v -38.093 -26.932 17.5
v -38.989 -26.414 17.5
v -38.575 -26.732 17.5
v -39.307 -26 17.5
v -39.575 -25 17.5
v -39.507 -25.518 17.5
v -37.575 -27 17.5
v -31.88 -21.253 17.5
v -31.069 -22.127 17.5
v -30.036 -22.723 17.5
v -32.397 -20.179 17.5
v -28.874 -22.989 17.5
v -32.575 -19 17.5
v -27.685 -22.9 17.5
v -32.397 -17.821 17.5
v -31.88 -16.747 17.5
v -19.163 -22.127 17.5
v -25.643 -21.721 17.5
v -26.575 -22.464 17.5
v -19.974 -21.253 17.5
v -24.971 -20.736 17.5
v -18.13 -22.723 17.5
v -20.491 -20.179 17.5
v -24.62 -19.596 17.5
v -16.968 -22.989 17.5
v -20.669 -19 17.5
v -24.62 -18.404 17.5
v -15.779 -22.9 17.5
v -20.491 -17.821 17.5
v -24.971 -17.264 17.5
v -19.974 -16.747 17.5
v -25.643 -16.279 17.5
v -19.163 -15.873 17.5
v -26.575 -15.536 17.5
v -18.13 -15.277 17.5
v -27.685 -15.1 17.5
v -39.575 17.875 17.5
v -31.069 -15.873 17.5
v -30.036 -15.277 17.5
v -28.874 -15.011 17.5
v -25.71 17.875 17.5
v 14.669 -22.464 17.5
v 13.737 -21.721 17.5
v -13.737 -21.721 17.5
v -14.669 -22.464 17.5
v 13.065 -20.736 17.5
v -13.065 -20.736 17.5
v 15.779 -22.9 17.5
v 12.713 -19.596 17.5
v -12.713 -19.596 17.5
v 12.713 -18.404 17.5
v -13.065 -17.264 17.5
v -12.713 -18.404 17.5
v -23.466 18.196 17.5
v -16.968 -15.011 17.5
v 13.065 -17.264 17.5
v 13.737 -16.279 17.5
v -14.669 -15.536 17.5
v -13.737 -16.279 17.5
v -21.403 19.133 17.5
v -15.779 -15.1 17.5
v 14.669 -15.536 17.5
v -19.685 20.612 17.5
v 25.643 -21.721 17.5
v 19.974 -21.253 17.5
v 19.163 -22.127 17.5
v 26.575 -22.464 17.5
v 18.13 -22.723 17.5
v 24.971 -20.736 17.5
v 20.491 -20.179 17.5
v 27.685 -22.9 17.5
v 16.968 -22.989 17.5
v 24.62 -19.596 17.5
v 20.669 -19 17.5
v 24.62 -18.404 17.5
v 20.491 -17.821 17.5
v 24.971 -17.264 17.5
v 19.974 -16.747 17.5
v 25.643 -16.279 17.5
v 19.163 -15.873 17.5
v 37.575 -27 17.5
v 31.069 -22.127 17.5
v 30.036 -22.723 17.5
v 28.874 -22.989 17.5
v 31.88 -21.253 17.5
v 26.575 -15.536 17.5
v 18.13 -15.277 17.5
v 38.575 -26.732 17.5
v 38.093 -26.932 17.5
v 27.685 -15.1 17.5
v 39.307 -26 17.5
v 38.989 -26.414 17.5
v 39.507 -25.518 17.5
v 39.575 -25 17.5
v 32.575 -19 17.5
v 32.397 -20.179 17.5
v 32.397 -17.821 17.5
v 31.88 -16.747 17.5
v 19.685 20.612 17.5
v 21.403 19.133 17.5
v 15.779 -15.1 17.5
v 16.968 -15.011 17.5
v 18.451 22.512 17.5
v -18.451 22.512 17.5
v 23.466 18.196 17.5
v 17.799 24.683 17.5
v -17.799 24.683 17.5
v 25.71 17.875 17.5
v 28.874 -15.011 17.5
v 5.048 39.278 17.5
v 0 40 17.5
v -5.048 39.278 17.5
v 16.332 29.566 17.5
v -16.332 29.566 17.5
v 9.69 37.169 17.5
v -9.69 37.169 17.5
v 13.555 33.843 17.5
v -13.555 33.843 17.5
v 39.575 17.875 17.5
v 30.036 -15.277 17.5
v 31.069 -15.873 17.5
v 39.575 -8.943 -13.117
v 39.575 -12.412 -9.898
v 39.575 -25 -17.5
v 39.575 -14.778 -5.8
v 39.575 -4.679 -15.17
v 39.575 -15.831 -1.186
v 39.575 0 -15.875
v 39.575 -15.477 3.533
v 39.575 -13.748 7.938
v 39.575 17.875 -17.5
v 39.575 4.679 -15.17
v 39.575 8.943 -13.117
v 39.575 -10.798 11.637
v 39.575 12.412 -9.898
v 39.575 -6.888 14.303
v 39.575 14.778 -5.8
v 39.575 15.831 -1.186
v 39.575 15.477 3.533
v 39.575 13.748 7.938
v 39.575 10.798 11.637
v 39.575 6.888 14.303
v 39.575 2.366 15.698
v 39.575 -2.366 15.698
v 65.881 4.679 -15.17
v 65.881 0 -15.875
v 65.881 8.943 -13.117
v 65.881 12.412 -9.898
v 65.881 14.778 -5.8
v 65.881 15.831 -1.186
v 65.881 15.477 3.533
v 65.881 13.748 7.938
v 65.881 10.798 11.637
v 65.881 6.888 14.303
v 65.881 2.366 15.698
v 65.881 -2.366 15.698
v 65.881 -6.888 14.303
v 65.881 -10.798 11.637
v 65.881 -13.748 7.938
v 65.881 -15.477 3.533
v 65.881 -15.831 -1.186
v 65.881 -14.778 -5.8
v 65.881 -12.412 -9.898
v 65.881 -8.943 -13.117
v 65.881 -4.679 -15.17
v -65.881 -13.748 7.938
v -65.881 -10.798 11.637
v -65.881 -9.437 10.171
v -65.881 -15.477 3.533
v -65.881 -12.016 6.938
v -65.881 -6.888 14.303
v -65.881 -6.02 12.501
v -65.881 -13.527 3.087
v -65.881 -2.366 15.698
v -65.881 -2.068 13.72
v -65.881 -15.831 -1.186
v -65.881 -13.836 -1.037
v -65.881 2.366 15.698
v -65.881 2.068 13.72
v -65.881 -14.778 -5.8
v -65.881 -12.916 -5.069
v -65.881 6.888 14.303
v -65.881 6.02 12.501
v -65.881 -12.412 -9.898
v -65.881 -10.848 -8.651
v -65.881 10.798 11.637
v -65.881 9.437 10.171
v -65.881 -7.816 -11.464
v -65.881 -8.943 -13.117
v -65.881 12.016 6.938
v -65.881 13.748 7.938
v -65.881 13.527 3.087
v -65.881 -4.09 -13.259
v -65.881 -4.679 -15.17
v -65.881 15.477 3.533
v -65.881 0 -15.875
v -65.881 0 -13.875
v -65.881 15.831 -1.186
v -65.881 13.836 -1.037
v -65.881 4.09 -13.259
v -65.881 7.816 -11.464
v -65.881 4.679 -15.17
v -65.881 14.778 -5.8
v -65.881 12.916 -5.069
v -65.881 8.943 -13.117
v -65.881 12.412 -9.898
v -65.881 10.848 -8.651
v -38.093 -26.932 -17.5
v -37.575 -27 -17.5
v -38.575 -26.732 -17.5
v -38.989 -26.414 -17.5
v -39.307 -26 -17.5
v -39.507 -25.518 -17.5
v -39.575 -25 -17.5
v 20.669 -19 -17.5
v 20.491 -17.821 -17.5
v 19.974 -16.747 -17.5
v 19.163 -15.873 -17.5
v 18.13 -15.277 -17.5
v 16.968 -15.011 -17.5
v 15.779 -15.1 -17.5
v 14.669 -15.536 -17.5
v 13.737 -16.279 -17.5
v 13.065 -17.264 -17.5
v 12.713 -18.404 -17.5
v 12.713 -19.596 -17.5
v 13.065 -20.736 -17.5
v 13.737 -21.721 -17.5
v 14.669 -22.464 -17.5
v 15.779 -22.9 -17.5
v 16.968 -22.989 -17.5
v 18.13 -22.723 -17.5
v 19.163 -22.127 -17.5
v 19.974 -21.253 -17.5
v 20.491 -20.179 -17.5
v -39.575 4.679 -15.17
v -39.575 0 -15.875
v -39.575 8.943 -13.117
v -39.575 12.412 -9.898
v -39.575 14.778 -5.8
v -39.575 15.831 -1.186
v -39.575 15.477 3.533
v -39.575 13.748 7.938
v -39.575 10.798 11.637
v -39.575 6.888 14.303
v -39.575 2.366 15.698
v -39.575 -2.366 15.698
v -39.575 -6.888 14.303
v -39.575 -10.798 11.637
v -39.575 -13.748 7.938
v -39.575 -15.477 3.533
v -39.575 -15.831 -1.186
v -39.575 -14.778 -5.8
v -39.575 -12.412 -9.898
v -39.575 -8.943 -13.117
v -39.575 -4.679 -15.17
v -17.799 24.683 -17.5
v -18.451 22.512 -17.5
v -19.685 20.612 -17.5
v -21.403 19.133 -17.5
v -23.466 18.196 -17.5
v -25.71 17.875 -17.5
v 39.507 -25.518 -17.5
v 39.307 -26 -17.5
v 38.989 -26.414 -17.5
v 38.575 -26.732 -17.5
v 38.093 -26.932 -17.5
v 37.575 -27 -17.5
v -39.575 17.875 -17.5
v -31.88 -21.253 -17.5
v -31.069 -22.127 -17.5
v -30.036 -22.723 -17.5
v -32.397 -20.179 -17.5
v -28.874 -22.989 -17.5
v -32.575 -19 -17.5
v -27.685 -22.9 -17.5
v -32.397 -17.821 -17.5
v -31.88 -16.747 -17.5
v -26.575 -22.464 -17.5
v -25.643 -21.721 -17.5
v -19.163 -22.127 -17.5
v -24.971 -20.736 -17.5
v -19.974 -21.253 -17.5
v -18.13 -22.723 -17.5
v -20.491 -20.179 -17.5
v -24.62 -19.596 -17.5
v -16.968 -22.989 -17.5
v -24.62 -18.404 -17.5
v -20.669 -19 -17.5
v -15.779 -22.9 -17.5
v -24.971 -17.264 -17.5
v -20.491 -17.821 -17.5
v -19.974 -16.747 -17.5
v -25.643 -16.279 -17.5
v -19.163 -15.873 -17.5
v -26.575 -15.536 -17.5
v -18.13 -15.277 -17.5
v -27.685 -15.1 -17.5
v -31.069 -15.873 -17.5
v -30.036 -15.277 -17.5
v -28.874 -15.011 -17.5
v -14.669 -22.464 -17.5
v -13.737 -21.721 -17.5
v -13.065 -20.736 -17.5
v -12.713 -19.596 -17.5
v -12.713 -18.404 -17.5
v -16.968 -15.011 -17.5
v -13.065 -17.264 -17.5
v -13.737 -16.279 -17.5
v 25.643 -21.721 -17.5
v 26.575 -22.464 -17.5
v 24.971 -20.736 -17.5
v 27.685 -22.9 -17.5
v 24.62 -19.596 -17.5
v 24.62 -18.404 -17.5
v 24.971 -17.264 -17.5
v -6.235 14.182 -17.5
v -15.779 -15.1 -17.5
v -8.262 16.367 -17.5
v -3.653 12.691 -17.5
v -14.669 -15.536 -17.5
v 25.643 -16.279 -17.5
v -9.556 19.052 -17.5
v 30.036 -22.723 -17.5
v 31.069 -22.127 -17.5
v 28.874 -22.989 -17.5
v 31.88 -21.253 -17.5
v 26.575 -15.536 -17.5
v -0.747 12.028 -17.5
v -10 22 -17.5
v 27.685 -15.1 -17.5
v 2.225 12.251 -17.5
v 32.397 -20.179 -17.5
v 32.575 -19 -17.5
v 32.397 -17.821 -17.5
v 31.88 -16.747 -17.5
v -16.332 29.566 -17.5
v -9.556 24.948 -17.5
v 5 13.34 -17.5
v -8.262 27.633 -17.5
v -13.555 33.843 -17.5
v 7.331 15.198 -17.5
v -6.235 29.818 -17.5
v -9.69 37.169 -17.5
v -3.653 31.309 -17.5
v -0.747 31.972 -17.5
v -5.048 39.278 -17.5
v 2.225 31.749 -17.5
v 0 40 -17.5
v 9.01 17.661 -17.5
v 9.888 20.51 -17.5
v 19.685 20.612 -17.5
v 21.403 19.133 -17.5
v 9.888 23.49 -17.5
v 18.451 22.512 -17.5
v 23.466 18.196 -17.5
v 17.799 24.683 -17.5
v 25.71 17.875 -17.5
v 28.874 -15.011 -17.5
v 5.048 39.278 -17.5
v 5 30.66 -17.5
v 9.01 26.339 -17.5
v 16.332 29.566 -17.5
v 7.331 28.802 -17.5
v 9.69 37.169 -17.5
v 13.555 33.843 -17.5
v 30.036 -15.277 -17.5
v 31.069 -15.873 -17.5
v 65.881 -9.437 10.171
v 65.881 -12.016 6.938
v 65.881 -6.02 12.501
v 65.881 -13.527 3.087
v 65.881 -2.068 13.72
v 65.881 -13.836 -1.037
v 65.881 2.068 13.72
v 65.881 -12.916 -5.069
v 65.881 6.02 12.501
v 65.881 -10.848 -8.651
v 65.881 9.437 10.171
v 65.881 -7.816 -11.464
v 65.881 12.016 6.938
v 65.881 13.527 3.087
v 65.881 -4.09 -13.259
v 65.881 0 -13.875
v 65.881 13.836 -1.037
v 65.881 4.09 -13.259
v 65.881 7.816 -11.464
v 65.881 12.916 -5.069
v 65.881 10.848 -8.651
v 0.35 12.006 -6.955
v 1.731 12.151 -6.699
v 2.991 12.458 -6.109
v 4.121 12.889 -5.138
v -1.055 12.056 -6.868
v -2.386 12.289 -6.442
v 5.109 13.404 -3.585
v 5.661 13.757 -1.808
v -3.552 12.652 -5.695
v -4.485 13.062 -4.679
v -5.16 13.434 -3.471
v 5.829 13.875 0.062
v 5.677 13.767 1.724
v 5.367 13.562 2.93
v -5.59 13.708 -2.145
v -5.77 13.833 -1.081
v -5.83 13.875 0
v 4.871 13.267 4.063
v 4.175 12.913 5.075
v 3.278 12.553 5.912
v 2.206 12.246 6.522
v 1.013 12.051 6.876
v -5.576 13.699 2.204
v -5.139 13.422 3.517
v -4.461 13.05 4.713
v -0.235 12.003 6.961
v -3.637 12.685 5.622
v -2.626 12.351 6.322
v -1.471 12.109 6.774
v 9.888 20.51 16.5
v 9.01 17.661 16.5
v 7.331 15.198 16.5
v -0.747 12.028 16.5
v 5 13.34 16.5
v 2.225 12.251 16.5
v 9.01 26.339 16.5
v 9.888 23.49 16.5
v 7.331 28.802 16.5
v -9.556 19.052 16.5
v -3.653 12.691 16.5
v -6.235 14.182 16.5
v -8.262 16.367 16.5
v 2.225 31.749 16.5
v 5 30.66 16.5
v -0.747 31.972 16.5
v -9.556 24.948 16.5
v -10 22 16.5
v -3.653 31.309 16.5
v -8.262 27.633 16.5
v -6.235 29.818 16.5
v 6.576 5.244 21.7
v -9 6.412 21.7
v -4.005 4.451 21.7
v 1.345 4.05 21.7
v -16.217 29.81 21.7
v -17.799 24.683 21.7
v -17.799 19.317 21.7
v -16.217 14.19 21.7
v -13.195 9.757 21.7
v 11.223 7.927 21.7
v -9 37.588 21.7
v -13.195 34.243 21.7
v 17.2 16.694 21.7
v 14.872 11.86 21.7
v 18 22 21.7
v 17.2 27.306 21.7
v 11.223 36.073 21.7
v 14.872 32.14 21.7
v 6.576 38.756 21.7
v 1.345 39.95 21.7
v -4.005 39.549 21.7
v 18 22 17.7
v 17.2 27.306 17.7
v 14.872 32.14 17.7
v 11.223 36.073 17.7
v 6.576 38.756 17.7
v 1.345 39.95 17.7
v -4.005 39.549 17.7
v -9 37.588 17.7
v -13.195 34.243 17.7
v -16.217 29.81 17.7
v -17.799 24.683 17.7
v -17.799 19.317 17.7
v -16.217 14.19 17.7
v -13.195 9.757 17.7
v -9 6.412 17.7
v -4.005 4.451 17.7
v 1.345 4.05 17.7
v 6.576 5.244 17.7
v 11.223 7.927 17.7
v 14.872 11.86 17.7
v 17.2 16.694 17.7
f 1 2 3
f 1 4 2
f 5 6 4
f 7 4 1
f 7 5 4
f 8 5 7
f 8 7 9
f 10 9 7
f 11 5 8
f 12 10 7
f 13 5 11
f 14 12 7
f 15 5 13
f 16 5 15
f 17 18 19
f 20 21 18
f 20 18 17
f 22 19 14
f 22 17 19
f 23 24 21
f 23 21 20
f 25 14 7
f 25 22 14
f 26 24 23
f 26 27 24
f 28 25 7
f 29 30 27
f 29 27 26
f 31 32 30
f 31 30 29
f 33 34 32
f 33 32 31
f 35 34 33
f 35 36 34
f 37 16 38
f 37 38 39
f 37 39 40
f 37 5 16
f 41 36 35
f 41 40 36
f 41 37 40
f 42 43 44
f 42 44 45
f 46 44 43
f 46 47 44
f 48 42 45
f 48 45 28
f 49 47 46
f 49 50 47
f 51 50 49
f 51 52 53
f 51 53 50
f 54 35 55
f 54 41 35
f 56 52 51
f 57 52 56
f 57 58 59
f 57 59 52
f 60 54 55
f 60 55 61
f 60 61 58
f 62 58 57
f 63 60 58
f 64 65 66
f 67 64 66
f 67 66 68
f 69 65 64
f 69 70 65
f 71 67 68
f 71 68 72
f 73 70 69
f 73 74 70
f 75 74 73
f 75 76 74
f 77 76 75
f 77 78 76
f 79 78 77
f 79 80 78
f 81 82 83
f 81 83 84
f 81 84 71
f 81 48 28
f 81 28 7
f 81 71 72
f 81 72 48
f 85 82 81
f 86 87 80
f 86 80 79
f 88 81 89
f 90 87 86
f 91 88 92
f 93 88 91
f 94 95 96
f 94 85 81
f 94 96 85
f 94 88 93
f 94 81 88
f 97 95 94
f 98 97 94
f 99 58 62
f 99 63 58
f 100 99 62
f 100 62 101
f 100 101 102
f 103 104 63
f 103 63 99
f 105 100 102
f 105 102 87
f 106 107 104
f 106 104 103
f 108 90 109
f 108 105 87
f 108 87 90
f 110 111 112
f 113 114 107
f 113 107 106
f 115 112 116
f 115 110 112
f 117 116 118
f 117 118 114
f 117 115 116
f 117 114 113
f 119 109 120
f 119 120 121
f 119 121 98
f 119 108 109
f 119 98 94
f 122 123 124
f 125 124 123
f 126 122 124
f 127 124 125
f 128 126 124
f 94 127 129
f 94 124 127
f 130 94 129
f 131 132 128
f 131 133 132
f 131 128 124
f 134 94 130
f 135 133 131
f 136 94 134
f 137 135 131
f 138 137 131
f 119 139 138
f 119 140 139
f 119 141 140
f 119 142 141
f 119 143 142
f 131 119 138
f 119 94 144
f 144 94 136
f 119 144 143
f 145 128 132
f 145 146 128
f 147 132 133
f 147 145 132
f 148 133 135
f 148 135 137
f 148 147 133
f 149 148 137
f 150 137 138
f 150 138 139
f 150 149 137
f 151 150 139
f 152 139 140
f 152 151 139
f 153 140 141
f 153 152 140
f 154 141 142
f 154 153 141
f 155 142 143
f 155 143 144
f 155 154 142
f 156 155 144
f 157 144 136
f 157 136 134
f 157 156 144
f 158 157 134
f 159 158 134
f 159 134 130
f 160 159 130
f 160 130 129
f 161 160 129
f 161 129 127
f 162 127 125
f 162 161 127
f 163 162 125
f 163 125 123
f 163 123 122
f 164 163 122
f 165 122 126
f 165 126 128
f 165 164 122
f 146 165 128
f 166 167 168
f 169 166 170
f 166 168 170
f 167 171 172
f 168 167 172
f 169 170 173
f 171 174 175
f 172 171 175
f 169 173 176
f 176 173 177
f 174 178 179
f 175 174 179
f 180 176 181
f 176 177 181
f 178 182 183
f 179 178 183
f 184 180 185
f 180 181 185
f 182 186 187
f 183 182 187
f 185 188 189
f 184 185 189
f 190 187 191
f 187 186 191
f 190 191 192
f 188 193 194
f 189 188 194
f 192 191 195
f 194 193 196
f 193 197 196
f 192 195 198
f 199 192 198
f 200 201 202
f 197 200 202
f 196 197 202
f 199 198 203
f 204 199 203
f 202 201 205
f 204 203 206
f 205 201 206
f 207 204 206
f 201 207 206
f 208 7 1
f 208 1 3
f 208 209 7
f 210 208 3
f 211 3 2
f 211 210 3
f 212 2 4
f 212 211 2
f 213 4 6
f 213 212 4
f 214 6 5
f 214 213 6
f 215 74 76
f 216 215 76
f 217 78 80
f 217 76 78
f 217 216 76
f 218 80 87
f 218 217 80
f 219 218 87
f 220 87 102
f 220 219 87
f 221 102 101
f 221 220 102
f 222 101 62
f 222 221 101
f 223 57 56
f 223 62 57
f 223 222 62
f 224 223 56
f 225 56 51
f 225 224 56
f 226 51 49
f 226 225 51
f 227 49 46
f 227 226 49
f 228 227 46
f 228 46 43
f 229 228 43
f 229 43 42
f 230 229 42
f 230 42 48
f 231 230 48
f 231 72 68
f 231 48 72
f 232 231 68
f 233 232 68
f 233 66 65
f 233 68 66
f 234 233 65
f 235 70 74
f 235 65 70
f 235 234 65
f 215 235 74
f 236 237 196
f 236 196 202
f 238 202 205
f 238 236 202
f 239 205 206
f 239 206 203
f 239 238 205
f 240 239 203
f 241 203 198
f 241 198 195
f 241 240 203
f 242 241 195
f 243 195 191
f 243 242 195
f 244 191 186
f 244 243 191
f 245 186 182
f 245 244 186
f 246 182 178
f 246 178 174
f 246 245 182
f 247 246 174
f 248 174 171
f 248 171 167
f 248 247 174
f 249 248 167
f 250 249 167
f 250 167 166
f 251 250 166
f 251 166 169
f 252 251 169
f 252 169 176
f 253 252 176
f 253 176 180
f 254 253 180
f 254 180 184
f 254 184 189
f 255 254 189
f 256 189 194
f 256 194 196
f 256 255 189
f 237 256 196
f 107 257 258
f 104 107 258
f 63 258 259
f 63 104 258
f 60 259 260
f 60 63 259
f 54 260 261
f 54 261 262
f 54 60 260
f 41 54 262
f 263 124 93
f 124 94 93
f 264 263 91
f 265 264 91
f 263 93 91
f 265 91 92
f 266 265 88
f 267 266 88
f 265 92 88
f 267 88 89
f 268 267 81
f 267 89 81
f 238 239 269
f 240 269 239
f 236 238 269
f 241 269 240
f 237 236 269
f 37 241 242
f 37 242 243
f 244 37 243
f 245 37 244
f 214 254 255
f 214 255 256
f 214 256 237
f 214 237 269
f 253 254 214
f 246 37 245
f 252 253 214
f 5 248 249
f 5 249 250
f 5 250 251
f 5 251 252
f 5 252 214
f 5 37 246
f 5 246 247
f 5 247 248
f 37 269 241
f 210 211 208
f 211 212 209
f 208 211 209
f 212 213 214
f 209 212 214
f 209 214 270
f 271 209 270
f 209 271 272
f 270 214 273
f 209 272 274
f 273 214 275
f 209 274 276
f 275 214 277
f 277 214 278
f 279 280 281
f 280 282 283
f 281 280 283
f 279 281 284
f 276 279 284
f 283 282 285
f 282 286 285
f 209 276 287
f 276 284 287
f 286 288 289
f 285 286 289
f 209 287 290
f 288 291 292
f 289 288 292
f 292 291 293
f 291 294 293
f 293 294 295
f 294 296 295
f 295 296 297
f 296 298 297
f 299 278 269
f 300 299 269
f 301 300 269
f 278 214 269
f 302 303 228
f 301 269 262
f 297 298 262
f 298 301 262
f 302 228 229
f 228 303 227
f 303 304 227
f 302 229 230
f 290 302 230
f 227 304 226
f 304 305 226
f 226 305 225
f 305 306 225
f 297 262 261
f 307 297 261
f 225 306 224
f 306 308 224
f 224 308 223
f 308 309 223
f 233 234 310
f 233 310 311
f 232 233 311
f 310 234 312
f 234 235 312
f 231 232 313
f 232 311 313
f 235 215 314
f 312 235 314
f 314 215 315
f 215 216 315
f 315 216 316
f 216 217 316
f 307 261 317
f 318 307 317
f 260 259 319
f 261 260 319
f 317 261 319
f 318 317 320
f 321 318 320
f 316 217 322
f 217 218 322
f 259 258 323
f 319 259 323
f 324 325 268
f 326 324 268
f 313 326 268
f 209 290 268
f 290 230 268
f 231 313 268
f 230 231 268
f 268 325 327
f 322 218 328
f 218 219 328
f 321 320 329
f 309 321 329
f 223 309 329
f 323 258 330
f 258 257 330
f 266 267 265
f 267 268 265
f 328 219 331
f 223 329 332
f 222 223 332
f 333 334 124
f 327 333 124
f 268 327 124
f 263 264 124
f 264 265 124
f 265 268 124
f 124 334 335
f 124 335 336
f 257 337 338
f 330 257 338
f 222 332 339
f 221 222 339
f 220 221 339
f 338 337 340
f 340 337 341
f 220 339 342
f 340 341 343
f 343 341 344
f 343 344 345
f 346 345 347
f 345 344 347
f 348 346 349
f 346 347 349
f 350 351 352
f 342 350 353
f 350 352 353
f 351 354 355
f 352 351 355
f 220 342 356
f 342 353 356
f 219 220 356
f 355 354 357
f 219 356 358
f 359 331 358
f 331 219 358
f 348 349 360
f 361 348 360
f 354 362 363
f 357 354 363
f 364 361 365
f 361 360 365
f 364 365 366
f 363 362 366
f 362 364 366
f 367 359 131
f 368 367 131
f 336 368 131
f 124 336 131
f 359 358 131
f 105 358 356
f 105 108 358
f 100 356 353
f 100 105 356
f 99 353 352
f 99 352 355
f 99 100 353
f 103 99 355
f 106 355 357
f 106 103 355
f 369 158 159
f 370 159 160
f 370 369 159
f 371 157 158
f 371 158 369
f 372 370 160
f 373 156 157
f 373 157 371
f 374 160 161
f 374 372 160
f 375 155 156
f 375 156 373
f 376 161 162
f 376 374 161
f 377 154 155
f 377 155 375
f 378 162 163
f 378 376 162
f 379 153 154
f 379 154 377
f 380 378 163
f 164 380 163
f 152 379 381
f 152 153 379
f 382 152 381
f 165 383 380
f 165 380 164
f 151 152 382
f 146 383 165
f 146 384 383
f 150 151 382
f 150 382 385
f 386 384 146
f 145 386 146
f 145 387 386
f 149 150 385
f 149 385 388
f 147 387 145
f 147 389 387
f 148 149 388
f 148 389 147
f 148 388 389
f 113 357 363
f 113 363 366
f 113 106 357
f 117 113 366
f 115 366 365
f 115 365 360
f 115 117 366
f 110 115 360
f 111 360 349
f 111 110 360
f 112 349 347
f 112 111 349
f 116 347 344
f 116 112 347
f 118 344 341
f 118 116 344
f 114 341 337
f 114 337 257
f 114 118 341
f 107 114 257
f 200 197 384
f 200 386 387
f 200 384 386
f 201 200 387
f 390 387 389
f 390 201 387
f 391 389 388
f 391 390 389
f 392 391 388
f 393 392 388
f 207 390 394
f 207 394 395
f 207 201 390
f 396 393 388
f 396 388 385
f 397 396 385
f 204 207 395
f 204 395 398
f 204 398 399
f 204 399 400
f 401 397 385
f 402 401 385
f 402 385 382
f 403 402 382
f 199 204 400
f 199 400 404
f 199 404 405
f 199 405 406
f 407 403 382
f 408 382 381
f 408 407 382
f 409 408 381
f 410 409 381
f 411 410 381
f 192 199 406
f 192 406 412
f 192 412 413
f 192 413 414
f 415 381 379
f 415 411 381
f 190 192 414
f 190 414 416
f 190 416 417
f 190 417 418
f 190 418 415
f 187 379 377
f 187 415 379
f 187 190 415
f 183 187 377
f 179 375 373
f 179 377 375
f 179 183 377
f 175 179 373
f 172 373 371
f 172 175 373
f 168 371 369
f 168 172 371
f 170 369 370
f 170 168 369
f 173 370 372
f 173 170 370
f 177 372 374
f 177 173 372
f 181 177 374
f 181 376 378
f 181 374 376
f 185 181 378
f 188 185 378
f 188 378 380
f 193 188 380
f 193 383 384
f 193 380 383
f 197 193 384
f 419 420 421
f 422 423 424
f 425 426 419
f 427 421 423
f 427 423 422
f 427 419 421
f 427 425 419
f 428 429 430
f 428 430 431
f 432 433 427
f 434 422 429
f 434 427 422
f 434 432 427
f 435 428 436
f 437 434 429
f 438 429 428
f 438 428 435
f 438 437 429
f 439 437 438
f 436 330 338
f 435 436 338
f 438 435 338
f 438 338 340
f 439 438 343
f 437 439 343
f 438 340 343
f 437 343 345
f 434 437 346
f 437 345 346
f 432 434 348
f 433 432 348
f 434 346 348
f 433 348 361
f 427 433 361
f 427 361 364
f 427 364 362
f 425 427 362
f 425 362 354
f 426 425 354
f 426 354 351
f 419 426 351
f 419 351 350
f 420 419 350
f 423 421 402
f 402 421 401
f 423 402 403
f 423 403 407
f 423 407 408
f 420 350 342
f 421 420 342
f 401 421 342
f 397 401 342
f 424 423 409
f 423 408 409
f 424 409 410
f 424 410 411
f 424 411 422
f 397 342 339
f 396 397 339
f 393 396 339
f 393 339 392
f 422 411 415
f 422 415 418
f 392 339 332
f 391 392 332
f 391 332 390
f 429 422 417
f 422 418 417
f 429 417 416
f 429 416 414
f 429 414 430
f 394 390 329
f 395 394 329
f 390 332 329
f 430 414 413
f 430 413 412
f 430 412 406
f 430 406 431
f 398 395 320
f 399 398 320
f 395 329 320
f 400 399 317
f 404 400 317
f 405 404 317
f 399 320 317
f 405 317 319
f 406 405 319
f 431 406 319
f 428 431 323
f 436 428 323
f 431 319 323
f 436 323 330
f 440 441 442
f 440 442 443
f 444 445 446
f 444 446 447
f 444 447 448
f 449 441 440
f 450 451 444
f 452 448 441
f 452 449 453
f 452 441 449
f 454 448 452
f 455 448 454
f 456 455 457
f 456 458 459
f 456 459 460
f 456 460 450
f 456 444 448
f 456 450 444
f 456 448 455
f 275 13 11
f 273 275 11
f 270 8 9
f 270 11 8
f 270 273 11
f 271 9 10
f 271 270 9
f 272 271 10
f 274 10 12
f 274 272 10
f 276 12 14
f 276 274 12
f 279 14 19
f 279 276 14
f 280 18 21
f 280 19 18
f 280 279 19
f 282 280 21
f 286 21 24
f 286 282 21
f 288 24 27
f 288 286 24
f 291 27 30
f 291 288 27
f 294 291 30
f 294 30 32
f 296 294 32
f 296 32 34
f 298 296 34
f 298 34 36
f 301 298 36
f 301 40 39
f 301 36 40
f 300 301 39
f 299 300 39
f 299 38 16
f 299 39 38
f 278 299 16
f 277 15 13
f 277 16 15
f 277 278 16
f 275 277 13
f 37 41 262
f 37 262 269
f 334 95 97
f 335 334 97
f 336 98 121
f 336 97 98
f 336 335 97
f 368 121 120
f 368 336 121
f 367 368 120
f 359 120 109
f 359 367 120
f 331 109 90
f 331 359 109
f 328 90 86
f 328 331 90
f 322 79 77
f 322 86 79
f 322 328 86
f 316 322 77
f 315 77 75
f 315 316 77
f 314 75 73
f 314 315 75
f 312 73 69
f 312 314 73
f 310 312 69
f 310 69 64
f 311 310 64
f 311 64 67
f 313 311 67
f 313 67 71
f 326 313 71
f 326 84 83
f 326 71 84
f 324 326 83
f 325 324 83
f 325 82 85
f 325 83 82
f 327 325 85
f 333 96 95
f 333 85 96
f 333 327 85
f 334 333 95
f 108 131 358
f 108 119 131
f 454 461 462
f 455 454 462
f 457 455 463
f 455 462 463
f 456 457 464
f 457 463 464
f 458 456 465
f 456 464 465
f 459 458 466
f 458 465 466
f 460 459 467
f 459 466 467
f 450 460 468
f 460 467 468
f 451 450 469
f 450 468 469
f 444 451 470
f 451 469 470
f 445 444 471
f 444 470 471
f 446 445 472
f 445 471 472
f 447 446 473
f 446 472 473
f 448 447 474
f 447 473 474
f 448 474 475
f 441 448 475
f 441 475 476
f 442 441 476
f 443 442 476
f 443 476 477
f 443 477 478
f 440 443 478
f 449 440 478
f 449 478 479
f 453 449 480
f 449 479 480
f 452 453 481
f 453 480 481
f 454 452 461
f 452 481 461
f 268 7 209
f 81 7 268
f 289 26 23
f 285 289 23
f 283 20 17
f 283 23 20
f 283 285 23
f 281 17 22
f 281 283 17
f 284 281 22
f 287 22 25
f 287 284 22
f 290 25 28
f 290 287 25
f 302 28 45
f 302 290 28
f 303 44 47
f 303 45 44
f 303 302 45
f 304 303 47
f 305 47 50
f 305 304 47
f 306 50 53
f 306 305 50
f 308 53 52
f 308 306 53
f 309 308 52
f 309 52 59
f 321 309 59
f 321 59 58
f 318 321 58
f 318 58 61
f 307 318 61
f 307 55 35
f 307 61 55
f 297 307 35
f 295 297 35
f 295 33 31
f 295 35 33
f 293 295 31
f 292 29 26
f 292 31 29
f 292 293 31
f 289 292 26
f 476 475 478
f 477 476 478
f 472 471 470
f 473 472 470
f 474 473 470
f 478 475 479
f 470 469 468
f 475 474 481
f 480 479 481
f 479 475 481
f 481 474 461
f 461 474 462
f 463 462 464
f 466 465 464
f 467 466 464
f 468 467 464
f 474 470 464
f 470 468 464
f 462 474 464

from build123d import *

# Parameters (mm, degrees)
SKETCH2_R               = 15.875
SKETCH2_R_2             = 13.875
BOSS_EXTRUDE1_DEPTH     = 65.88125
SKETCH3_R               = 4
BOSS_EXTRUDE2_DEPTH     = 17.5
CUT_EXTRUDE1_DEPTH      = 80.035366144
CUT_EXTRUDE1_DEPTH_BACK = 80.035366144
SKETCH2_3_R             = 13.875
CUT_EXTRUDE2_DEPTH      = 80.035366144
CUT_EXTRUDE2_DEPTH_BACK = 80.035366144
SKETCH3_3_R             = 4
FILLET1_R               = 2
BOSS_EXTRUDE3_START     = 0.2
SKETCH4_R               = 18
BOSS_EXTRUDE3_DEPTH     = 4
SKETCH5_R               = 7.9375
BOSS_EXTRUDE4_DEPTH     = 40
CHAMFER1_SIZE           = 1
CUT_EXTRUDE3_START      = -25
CUT_EXTRUDE3_DEPTH      = 25
SKETCH8_R               = 10
CUT_EXTRUDE4_DEPTH      = 34


# Read off the part's stored shape, not the designer's step: Split1
with BuildPart() as part:
    # Sketch2 → Boss-Extrude1 (new, symmetric)
    # profile 1 of 2: a face of its own
    with BuildSketch(Plane(origin=(0, 0, 0), x_dir=(0, 0, -1), z_dir=(1, 0, 0))):
        Circle(SKETCH2_R)
        Circle(SKETCH2_R_2, mode=Mode.SUBTRACT)
    # profile 2 of 2: a face of its own
    with BuildSketch(Plane(origin=(0, 0, 0), x_dir=(0, 0, -1), z_dir=(1, 0, 0))):
        Circle(SKETCH2_R_2)
    extrude(amount=BOSS_EXTRUDE1_DEPTH, both=True)

    # Sketch3 → Boss-Extrude2 (add, symmetric)
    # profile 1 of 6: a face of its own
    with BuildSketch(Plane.XY):
        with BuildLine():
            Line((0, -27), (0, 40))
            ThreePointArc((0, 40), (-11.74119965, 35.643468429), (-17.798965194, 24.682692308))
            ThreePointArc((-17.798965194, 24.682692308), (-20.491305436, 19.811236254), (-25.709616392, 17.875))
            Line((-25.709616392, 17.875), (-39.575, 17.875))
            Line((-39.575, 17.875), (-39.575, -27))
            Line((-39.575, -27), (0, -27))
        make_face()
        with Locations((-28.575, -19)):
            Circle(SKETCH3_R, mode=Mode.SUBTRACT)
        with Locations((-16.66875, -19)):
            Circle(SKETCH3_R, mode=Mode.SUBTRACT)
    # profile 2 of 6: a face of its own
    with BuildSketch(Plane.XY):
        with Locations((-28.575, -19)):
            Circle(SKETCH3_R)
    # profile 3 of 6: a face of its own
    with BuildSketch(Plane.XY):
        with Locations((-16.66875, -19)):
            Circle(SKETCH3_R)
    # profile 4 of 6: a face of its own
    with BuildSketch(Plane.XY):
        with BuildLine():
            ThreePointArc((17.798965194, 24.682692308), (11.74119965, 35.643468429), (0, 40))
            Line((0, 40), (0, -27))
            Line((0, -27), (39.575, -27))
            Line((39.575, -27), (39.575, 17.875))
            Line((39.575, 17.875), (25.709616392, 17.875))
            ThreePointArc((25.709616392, 17.875), (20.491305436, 19.811236254), (17.798965194, 24.682692308))
        make_face()
        with Locations((16.66875, -19)):
            Circle(SKETCH3_R, mode=Mode.SUBTRACT)
        with Locations((28.575, -19)):
            Circle(SKETCH3_R, mode=Mode.SUBTRACT)
    # profile 5 of 6: a face of its own
    with BuildSketch(Plane.XY):
        with Locations((28.575, -19)):
            Circle(SKETCH3_R)
    # profile 6 of 6: a face of its own
    with BuildSketch(Plane.XY):
        with Locations((16.66875, -19)):
            Circle(SKETCH3_R)
    extrude(amount=BOSS_EXTRUDE2_DEPTH, both=True)

    # Sketch2<3> → Cut-Extrude1 (cut, two sides: drawn at the far end of the back side and taken through both)
    with BuildSketch(Plane(origin=(0, 0, 0), x_dir=(0, 0, -1), z_dir=(1, 0, 0)).offset(-CUT_EXTRUDE1_DEPTH_BACK)):
        Circle(SKETCH2_3_R)
    extrude(amount=CUT_EXTRUDE1_DEPTH + CUT_EXTRUDE1_DEPTH_BACK, mode=Mode.SUBTRACT)

    # Sketch3<3> → Cut-Extrude2 (cut, two sides: drawn at the far end of the back side and taken through both)
    with BuildSketch(Plane.XY.offset(-CUT_EXTRUDE2_DEPTH_BACK)):
        with Locations((16.66875, -19)):
            Circle(SKETCH3_3_R)
        with Locations((28.575, -19)):
            Circle(SKETCH3_3_R)
        with Locations(Location((-28.575, -19, 0), (0, 0, 180))):
            Circle(SKETCH3_3_R)
        with Locations(Location((-16.66875, -19, 0), (0, 0, 180))):
            Circle(SKETCH3_3_R)
    extrude(amount=CUT_EXTRUDE2_DEPTH + CUT_EXTRUDE2_DEPTH_BACK, mode=Mode.SUBTRACT)

    # Fillet1
    fillet1_edges = [part.edges().sort_by_distance(p)[0] for p in [
        (39.575, -27, 0),
        (-39.575, -27, 0),
    ]]
    fillet(fillet1_edges, radius=FILLET1_R)

    # Sketch5 → Boss-Extrude4 (add)
    with BuildSketch(Plane(origin=(0, 0, -17.5), x_dir=(-1, 0, 0), z_dir=(0, 0, -1))):
        with Locations(Location((0, 22, 0), (0, 0, 180))):
            Circle(SKETCH5_R)
    extrude(amount=BOSS_EXTRUDE4_DEPTH)

    # Chamfer1
    chamfer1_edges = [part.edges().sort_by_distance(p)[0] for p in [
        (-7.9375, 22, -57.5),
    ]]
    chamfer(chamfer1_edges, length=CHAMFER1_SIZE)

    # Sketch6 → Cut-Revolve1 (revolve, cut)
    with BuildSketch(Plane(origin=(0, 0, 0), x_dir=(0, 0, -1), z_dir=(1, 0, 0)), mode=Mode.PRIVATE) as cut_revolve1_sk:
        with BuildLine():
            Line((49.5, 29.9375), (45.027864045, 29.9375))
            ThreePointArc((45.027864045, 29.9375), (47.263932023, 28.9375), (49.5, 29.9375))
        make_face()
    revolve(cut_revolve1_sk.sketch.rotate(Axis((0, 22, -57.5), (0, 0, 1)), 90), axis=Axis((0, 22, -57.5), (0, 0, 1)), mode=Mode.SUBTRACT)

    # Sketch7 → Cut-Extrude3 (cut)
    with BuildSketch(Plane(origin=(0, 0, -57.5), x_dir=(-1, 0, 0), z_dir=(0, 0, -1)).offset(CUT_EXTRUDE3_START)):
        with BuildLine():
            Line((0, 29.4375), (0.4, 29.927414853))
            ThreePointArc((0.4, 29.927414853), (0, 29.9375), (-0.4, 29.927414853))
            Line((-0.4, 29.927414853), (0, 29.4375))
        make_face()
        with BuildLine():
            Line((1.291508321, 29.324507663), (1.770504244, 29.737520337))
            ThreePointArc((1.770504244, 29.737520337), (1.37833241, 29.81691154), (0.982658042, 29.87643888))
            Line((0.982658042, 29.87643888), (1.291508321, 29.324507663))
        make_face()
        with BuildLine():
            Line((2.543774816, 28.988963867), (3.087212613, 29.312525182))
            ThreePointArc((3.087212613, 29.312525182), (2.714784888, 29.458810177), (2.335458516, 29.586141297))
            Line((2.335458516, 29.586141297), (2.543774816, 28.988963867))
        make_face()
        with BuildLine():
            Line((3.71875, 28.441063941), (4.310117588, 28.665342649))
            ThreePointArc((4.310117588, 28.665342649), (3.96875, 28.874076643), (3.617297265, 29.065342649))
            Line((3.617297265, 29.065342649), (3.71875, 28.441063941))
        make_face()
        with BuildLine():
            Line((4.780732847, 27.697455546), (5.402061822, 27.815637052))
            ThreePointArc((5.402061822, 27.815637052), (5.102126652, 28.080477767), (4.789226267, 28.32986714))
            Line((4.789226267, 28.32986714), (4.780732847, 27.697455546))
        make_face()
        with BuildLine():
            Line((5.697455546, 26.780732847), (6.32986714, 26.789226267))
            ThreePointArc((6.32986714, 26.789226267), (6.080477767, 27.102126652), (5.815637052, 27.402061822))
            Line((5.815637052, 27.402061822), (5.697455546, 26.780732847))
        make_face()
        with BuildLine():
            Line((6.441063941, 25.71875), (7.065342649, 25.617297265))
            ThreePointArc((7.065342649, 25.617297265), (6.874076643, 25.96875), (6.665342649, 26.310117588))
            Line((6.665342649, 26.310117588), (6.441063941, 25.71875))
        make_face()
        with BuildLine():
            Line((6.988963867, 24.543774816), (7.586141297, 24.335458516))
            ThreePointArc((7.586141297, 24.335458516), (7.458810177, 24.714784888), (7.312525182, 25.087212613))
            Line((7.312525182, 25.087212613), (6.988963867, 24.543774816))
        make_face()
        with BuildLine():
            Line((7.324507663, 23.291508321), (7.87643888, 22.982658042))
            ThreePointArc((7.87643888, 22.982658042), (7.81691154, 23.37833241), (7.737520337, 23.770504244))
            Line((7.737520337, 23.770504244), (7.324507663, 23.291508321))
        make_face()
        with BuildLine():
            Line((7.4375, 22), (7.927414853, 21.6))
            ThreePointArc((7.927414853, 21.6), (7.9375, 22), (7.927414853, 22.4))
            Line((7.927414853, 22.4), (7.4375, 22))
        make_face()
        with BuildLine():
            Line((7.324507663, 20.708491679), (7.737520337, 20.229495756))
            ThreePointArc((7.737520337, 20.229495756), (7.81691154, 20.62166759), (7.87643888, 21.017341958))
            Line((7.87643888, 21.017341958), (7.324507663, 20.708491679))
        make_face()
        with BuildLine():
            Line((6.988963867, 19.456225184), (7.312525182, 18.912787387))
            ThreePointArc((7.312525182, 18.912787387), (7.458810177, 19.285215112), (7.586141297, 19.664541484))
            Line((7.586141297, 19.664541484), (6.988963867, 19.456225184))
        make_face()
        with BuildLine():
            Line((6.441063941, 18.28125), (6.665342649, 17.689882412))
            ThreePointArc((6.665342649, 17.689882412), (6.874076643, 18.03125), (7.065342649, 18.382702735))
            Line((7.065342649, 18.382702735), (6.441063941, 18.28125))
        make_face()
        with BuildLine():
            Line((5.697455546, 17.219267153), (5.815637052, 16.597938178))
            ThreePointArc((5.815637052, 16.597938178), (6.080477767, 16.897873348), (6.32986714, 17.210773733))
            Line((6.32986714, 17.210773733), (5.697455546, 17.219267153))
        make_face()
        with BuildLine():
            Line((4.780732847, 16.302544454), (4.789226267, 15.67013286))
            ThreePointArc((4.789226267, 15.67013286), (5.102126652, 15.919522233), (5.402061822, 16.184362948))
            Line((5.402061822, 16.184362948), (4.780732847, 16.302544454))
        make_face()
        with BuildLine():
            Line((3.71875, 15.558936059), (3.617297265, 14.934657351))
            ThreePointArc((3.617297265, 14.934657351), (3.96875, 15.125923357), (4.310117588, 15.334657351))
            Line((4.310117588, 15.334657351), (3.71875, 15.558936059))
        make_face()
        with BuildLine():
            Line((2.543774816, 15.011036133), (2.335458516, 14.413858703))
            ThreePointArc((2.335458516, 14.413858703), (2.714784888, 14.541189823), (3.087212613, 14.687474818))
            Line((3.087212613, 14.687474818), (2.543774816, 15.011036133))
        make_face()
        with BuildLine():
            Line((1.291508321, 14.675492337), (0.982658042, 14.12356112))
            ThreePointArc((0.982658042, 14.12356112), (1.37833241, 14.18308846), (1.770504244, 14.262479663))
            Line((1.770504244, 14.262479663), (1.291508321, 14.675492337))
        make_face()
        with BuildLine():
            Line((0, 14.5625), (-0.4, 14.072585147))
            ThreePointArc((-0.4, 14.072585147), (0, 14.0625), (0.4, 14.072585147))
            Line((0.4, 14.072585147), (0, 14.5625))
        make_face()
        with BuildLine():
            Line((-1.291508321, 14.675492337), (-1.770504244, 14.262479663))
            ThreePointArc((-1.770504244, 14.262479663), (-1.37833241, 14.18308846), (-0.982658042, 14.12356112))
            Line((-0.982658042, 14.12356112), (-1.291508321, 14.675492337))
        make_face()
        with BuildLine():
            Line((-2.543774816, 15.011036133), (-3.087212613, 14.687474818))
            ThreePointArc((-3.087212613, 14.687474818), (-2.714784888, 14.541189823), (-2.335458516, 14.413858703))
            Line((-2.335458516, 14.413858703), (-2.543774816, 15.011036133))
        make_face()
        with BuildLine():
            Line((-3.71875, 15.558936059), (-4.310117588, 15.334657351))
            ThreePointArc((-4.310117588, 15.334657351), (-3.96875, 15.125923357), (-3.617297265, 14.934657351))
            Line((-3.617297265, 14.934657351), (-3.71875, 15.558936059))
        make_face()
        with BuildLine():
            Line((-4.780732847, 16.302544454), (-5.402061822, 16.184362948))
            ThreePointArc((-5.402061822, 16.184362948), (-5.102126652, 15.919522233), (-4.789226267, 15.67013286))
            Line((-4.789226267, 15.67013286), (-4.780732847, 16.302544454))
        make_face()
        with BuildLine():
            Line((-5.697455546, 17.219267153), (-6.32986714, 17.210773733))
            ThreePointArc((-6.32986714, 17.210773733), (-6.080477767, 16.897873348), (-5.815637052, 16.597938178))
            Line((-5.815637052, 16.597938178), (-5.697455546, 17.219267153))
        make_face()
        with BuildLine():
            Line((-6.441063941, 18.28125), (-7.065342649, 18.382702735))
            ThreePointArc((-7.065342649, 18.382702735), (-6.874076643, 18.03125), (-6.665342649, 17.689882412))
            Line((-6.665342649, 17.689882412), (-6.441063941, 18.28125))
        make_face()
        with BuildLine():
            Line((-6.988963867, 19.456225184), (-7.586141297, 19.664541484))
            ThreePointArc((-7.586141297, 19.664541484), (-7.458810177, 19.285215112), (-7.312525182, 18.912787387))
            Line((-7.312525182, 18.912787387), (-6.988963867, 19.456225184))
        make_face()
        with BuildLine():
            Line((-7.324507663, 20.708491679), (-7.87643888, 21.017341958))
            ThreePointArc((-7.87643888, 21.017341958), (-7.81691154, 20.62166759), (-7.737520337, 20.229495756))
            Line((-7.737520337, 20.229495756), (-7.324507663, 20.708491679))
        make_face()
        with BuildLine():
            Line((-7.4375, 22), (-7.927414853, 22.4))
            ThreePointArc((-7.927414853, 22.4), (-7.9375, 22), (-7.927414853, 21.6))
            Line((-7.927414853, 21.6), (-7.4375, 22))
        make_face()
        with BuildLine():
            Line((-7.324507663, 23.291508321), (-7.737520337, 23.770504244))
            ThreePointArc((-7.737520337, 23.770504244), (-7.81691154, 23.37833241), (-7.87643888, 22.982658042))
            Line((-7.87643888, 22.982658042), (-7.324507663, 23.291508321))
        make_face()
        with BuildLine():
            Line((-6.988963867, 24.543774816), (-7.312525182, 25.087212613))
            ThreePointArc((-7.312525182, 25.087212613), (-7.458810177, 24.714784888), (-7.586141297, 24.335458516))
            Line((-7.586141297, 24.335458516), (-6.988963867, 24.543774816))
        make_face()
        with BuildLine():
            Line((-6.441063941, 25.71875), (-6.665342649, 26.310117588))
            ThreePointArc((-6.665342649, 26.310117588), (-6.874076643, 25.96875), (-7.065342649, 25.617297265))
            Line((-7.065342649, 25.617297265), (-6.441063941, 25.71875))
        make_face()
        with BuildLine():
            Line((-5.697455546, 26.780732847), (-5.815637052, 27.402061822))
            ThreePointArc((-5.815637052, 27.402061822), (-6.080477767, 27.102126652), (-6.32986714, 26.789226267))
            Line((-6.32986714, 26.789226267), (-5.697455546, 26.780732847))
        make_face()
        with BuildLine():
            Line((-4.780732847, 27.697455546), (-4.789226267, 28.32986714))
            ThreePointArc((-4.789226267, 28.32986714), (-5.102126652, 28.080477767), (-5.402061822, 27.815637052))
            Line((-5.402061822, 27.815637052), (-4.780732847, 27.697455546))
        make_face()
        with BuildLine():
            Line((-3.71875, 28.441063941), (-3.617297265, 29.065342649))
            ThreePointArc((-3.617297265, 29.065342649), (-3.96875, 28.874076643), (-4.310117588, 28.665342649))
            Line((-4.310117588, 28.665342649), (-3.71875, 28.441063941))
        make_face()
        with BuildLine():
            Line((-2.543774816, 28.988963867), (-2.335458516, 29.586141297))
            ThreePointArc((-2.335458516, 29.586141297), (-2.714784888, 29.458810177), (-3.087212613, 29.312525182))
            Line((-3.087212613, 29.312525182), (-2.543774816, 28.988963867))
        make_face()
        with BuildLine():
            Line((-1.291508321, 29.324507663), (-0.982658042, 29.87643888))
            ThreePointArc((-0.982658042, 29.87643888), (-1.37833241, 29.81691154), (-1.770504244, 29.737520337))
            Line((-1.770504244, 29.737520337), (-1.291508321, 29.324507663))
        make_face()
    extrude(amount=CUT_EXTRUDE3_DEPTH, mode=Mode.SUBTRACT)


with BuildPart() as body_2:
    # Sketch4 → Boss-Extrude3 (new body)
    with BuildSketch(Plane.XY.offset(17.5).offset(BOSS_EXTRUDE3_START)):
        with Locations((0, 22)):
            Circle(SKETCH4_R)
    extrude(amount=BOSS_EXTRUDE3_DEPTH)


with BuildPart() as body_3:
    # Split1: the piece on the far side of the plane
    add(part.part)
    split(bisect_by=Plane.XY.offset(-17.5), keep=Keep.BOTTOM)


with BuildPart() as part_1:
    add(part.part)

    # Split1
    split(bisect_by=Plane.XY.offset(-17.5), keep=Keep.TOP)

    # Sketch8 → Cut-Extrude4 (cut)
    with BuildSketch(Plane(origin=(0, 0, -17.5), x_dir=(-1, 0, 0), z_dir=(0, 0, -1))):
        with Locations((0, 22)):
            Circle(SKETCH8_R)
    extrude(amount=-CUT_EXTRUDE4_DEPTH, mode=Mode.SUBTRACT)


solid = Compound([body_2.part, part_1.part])
